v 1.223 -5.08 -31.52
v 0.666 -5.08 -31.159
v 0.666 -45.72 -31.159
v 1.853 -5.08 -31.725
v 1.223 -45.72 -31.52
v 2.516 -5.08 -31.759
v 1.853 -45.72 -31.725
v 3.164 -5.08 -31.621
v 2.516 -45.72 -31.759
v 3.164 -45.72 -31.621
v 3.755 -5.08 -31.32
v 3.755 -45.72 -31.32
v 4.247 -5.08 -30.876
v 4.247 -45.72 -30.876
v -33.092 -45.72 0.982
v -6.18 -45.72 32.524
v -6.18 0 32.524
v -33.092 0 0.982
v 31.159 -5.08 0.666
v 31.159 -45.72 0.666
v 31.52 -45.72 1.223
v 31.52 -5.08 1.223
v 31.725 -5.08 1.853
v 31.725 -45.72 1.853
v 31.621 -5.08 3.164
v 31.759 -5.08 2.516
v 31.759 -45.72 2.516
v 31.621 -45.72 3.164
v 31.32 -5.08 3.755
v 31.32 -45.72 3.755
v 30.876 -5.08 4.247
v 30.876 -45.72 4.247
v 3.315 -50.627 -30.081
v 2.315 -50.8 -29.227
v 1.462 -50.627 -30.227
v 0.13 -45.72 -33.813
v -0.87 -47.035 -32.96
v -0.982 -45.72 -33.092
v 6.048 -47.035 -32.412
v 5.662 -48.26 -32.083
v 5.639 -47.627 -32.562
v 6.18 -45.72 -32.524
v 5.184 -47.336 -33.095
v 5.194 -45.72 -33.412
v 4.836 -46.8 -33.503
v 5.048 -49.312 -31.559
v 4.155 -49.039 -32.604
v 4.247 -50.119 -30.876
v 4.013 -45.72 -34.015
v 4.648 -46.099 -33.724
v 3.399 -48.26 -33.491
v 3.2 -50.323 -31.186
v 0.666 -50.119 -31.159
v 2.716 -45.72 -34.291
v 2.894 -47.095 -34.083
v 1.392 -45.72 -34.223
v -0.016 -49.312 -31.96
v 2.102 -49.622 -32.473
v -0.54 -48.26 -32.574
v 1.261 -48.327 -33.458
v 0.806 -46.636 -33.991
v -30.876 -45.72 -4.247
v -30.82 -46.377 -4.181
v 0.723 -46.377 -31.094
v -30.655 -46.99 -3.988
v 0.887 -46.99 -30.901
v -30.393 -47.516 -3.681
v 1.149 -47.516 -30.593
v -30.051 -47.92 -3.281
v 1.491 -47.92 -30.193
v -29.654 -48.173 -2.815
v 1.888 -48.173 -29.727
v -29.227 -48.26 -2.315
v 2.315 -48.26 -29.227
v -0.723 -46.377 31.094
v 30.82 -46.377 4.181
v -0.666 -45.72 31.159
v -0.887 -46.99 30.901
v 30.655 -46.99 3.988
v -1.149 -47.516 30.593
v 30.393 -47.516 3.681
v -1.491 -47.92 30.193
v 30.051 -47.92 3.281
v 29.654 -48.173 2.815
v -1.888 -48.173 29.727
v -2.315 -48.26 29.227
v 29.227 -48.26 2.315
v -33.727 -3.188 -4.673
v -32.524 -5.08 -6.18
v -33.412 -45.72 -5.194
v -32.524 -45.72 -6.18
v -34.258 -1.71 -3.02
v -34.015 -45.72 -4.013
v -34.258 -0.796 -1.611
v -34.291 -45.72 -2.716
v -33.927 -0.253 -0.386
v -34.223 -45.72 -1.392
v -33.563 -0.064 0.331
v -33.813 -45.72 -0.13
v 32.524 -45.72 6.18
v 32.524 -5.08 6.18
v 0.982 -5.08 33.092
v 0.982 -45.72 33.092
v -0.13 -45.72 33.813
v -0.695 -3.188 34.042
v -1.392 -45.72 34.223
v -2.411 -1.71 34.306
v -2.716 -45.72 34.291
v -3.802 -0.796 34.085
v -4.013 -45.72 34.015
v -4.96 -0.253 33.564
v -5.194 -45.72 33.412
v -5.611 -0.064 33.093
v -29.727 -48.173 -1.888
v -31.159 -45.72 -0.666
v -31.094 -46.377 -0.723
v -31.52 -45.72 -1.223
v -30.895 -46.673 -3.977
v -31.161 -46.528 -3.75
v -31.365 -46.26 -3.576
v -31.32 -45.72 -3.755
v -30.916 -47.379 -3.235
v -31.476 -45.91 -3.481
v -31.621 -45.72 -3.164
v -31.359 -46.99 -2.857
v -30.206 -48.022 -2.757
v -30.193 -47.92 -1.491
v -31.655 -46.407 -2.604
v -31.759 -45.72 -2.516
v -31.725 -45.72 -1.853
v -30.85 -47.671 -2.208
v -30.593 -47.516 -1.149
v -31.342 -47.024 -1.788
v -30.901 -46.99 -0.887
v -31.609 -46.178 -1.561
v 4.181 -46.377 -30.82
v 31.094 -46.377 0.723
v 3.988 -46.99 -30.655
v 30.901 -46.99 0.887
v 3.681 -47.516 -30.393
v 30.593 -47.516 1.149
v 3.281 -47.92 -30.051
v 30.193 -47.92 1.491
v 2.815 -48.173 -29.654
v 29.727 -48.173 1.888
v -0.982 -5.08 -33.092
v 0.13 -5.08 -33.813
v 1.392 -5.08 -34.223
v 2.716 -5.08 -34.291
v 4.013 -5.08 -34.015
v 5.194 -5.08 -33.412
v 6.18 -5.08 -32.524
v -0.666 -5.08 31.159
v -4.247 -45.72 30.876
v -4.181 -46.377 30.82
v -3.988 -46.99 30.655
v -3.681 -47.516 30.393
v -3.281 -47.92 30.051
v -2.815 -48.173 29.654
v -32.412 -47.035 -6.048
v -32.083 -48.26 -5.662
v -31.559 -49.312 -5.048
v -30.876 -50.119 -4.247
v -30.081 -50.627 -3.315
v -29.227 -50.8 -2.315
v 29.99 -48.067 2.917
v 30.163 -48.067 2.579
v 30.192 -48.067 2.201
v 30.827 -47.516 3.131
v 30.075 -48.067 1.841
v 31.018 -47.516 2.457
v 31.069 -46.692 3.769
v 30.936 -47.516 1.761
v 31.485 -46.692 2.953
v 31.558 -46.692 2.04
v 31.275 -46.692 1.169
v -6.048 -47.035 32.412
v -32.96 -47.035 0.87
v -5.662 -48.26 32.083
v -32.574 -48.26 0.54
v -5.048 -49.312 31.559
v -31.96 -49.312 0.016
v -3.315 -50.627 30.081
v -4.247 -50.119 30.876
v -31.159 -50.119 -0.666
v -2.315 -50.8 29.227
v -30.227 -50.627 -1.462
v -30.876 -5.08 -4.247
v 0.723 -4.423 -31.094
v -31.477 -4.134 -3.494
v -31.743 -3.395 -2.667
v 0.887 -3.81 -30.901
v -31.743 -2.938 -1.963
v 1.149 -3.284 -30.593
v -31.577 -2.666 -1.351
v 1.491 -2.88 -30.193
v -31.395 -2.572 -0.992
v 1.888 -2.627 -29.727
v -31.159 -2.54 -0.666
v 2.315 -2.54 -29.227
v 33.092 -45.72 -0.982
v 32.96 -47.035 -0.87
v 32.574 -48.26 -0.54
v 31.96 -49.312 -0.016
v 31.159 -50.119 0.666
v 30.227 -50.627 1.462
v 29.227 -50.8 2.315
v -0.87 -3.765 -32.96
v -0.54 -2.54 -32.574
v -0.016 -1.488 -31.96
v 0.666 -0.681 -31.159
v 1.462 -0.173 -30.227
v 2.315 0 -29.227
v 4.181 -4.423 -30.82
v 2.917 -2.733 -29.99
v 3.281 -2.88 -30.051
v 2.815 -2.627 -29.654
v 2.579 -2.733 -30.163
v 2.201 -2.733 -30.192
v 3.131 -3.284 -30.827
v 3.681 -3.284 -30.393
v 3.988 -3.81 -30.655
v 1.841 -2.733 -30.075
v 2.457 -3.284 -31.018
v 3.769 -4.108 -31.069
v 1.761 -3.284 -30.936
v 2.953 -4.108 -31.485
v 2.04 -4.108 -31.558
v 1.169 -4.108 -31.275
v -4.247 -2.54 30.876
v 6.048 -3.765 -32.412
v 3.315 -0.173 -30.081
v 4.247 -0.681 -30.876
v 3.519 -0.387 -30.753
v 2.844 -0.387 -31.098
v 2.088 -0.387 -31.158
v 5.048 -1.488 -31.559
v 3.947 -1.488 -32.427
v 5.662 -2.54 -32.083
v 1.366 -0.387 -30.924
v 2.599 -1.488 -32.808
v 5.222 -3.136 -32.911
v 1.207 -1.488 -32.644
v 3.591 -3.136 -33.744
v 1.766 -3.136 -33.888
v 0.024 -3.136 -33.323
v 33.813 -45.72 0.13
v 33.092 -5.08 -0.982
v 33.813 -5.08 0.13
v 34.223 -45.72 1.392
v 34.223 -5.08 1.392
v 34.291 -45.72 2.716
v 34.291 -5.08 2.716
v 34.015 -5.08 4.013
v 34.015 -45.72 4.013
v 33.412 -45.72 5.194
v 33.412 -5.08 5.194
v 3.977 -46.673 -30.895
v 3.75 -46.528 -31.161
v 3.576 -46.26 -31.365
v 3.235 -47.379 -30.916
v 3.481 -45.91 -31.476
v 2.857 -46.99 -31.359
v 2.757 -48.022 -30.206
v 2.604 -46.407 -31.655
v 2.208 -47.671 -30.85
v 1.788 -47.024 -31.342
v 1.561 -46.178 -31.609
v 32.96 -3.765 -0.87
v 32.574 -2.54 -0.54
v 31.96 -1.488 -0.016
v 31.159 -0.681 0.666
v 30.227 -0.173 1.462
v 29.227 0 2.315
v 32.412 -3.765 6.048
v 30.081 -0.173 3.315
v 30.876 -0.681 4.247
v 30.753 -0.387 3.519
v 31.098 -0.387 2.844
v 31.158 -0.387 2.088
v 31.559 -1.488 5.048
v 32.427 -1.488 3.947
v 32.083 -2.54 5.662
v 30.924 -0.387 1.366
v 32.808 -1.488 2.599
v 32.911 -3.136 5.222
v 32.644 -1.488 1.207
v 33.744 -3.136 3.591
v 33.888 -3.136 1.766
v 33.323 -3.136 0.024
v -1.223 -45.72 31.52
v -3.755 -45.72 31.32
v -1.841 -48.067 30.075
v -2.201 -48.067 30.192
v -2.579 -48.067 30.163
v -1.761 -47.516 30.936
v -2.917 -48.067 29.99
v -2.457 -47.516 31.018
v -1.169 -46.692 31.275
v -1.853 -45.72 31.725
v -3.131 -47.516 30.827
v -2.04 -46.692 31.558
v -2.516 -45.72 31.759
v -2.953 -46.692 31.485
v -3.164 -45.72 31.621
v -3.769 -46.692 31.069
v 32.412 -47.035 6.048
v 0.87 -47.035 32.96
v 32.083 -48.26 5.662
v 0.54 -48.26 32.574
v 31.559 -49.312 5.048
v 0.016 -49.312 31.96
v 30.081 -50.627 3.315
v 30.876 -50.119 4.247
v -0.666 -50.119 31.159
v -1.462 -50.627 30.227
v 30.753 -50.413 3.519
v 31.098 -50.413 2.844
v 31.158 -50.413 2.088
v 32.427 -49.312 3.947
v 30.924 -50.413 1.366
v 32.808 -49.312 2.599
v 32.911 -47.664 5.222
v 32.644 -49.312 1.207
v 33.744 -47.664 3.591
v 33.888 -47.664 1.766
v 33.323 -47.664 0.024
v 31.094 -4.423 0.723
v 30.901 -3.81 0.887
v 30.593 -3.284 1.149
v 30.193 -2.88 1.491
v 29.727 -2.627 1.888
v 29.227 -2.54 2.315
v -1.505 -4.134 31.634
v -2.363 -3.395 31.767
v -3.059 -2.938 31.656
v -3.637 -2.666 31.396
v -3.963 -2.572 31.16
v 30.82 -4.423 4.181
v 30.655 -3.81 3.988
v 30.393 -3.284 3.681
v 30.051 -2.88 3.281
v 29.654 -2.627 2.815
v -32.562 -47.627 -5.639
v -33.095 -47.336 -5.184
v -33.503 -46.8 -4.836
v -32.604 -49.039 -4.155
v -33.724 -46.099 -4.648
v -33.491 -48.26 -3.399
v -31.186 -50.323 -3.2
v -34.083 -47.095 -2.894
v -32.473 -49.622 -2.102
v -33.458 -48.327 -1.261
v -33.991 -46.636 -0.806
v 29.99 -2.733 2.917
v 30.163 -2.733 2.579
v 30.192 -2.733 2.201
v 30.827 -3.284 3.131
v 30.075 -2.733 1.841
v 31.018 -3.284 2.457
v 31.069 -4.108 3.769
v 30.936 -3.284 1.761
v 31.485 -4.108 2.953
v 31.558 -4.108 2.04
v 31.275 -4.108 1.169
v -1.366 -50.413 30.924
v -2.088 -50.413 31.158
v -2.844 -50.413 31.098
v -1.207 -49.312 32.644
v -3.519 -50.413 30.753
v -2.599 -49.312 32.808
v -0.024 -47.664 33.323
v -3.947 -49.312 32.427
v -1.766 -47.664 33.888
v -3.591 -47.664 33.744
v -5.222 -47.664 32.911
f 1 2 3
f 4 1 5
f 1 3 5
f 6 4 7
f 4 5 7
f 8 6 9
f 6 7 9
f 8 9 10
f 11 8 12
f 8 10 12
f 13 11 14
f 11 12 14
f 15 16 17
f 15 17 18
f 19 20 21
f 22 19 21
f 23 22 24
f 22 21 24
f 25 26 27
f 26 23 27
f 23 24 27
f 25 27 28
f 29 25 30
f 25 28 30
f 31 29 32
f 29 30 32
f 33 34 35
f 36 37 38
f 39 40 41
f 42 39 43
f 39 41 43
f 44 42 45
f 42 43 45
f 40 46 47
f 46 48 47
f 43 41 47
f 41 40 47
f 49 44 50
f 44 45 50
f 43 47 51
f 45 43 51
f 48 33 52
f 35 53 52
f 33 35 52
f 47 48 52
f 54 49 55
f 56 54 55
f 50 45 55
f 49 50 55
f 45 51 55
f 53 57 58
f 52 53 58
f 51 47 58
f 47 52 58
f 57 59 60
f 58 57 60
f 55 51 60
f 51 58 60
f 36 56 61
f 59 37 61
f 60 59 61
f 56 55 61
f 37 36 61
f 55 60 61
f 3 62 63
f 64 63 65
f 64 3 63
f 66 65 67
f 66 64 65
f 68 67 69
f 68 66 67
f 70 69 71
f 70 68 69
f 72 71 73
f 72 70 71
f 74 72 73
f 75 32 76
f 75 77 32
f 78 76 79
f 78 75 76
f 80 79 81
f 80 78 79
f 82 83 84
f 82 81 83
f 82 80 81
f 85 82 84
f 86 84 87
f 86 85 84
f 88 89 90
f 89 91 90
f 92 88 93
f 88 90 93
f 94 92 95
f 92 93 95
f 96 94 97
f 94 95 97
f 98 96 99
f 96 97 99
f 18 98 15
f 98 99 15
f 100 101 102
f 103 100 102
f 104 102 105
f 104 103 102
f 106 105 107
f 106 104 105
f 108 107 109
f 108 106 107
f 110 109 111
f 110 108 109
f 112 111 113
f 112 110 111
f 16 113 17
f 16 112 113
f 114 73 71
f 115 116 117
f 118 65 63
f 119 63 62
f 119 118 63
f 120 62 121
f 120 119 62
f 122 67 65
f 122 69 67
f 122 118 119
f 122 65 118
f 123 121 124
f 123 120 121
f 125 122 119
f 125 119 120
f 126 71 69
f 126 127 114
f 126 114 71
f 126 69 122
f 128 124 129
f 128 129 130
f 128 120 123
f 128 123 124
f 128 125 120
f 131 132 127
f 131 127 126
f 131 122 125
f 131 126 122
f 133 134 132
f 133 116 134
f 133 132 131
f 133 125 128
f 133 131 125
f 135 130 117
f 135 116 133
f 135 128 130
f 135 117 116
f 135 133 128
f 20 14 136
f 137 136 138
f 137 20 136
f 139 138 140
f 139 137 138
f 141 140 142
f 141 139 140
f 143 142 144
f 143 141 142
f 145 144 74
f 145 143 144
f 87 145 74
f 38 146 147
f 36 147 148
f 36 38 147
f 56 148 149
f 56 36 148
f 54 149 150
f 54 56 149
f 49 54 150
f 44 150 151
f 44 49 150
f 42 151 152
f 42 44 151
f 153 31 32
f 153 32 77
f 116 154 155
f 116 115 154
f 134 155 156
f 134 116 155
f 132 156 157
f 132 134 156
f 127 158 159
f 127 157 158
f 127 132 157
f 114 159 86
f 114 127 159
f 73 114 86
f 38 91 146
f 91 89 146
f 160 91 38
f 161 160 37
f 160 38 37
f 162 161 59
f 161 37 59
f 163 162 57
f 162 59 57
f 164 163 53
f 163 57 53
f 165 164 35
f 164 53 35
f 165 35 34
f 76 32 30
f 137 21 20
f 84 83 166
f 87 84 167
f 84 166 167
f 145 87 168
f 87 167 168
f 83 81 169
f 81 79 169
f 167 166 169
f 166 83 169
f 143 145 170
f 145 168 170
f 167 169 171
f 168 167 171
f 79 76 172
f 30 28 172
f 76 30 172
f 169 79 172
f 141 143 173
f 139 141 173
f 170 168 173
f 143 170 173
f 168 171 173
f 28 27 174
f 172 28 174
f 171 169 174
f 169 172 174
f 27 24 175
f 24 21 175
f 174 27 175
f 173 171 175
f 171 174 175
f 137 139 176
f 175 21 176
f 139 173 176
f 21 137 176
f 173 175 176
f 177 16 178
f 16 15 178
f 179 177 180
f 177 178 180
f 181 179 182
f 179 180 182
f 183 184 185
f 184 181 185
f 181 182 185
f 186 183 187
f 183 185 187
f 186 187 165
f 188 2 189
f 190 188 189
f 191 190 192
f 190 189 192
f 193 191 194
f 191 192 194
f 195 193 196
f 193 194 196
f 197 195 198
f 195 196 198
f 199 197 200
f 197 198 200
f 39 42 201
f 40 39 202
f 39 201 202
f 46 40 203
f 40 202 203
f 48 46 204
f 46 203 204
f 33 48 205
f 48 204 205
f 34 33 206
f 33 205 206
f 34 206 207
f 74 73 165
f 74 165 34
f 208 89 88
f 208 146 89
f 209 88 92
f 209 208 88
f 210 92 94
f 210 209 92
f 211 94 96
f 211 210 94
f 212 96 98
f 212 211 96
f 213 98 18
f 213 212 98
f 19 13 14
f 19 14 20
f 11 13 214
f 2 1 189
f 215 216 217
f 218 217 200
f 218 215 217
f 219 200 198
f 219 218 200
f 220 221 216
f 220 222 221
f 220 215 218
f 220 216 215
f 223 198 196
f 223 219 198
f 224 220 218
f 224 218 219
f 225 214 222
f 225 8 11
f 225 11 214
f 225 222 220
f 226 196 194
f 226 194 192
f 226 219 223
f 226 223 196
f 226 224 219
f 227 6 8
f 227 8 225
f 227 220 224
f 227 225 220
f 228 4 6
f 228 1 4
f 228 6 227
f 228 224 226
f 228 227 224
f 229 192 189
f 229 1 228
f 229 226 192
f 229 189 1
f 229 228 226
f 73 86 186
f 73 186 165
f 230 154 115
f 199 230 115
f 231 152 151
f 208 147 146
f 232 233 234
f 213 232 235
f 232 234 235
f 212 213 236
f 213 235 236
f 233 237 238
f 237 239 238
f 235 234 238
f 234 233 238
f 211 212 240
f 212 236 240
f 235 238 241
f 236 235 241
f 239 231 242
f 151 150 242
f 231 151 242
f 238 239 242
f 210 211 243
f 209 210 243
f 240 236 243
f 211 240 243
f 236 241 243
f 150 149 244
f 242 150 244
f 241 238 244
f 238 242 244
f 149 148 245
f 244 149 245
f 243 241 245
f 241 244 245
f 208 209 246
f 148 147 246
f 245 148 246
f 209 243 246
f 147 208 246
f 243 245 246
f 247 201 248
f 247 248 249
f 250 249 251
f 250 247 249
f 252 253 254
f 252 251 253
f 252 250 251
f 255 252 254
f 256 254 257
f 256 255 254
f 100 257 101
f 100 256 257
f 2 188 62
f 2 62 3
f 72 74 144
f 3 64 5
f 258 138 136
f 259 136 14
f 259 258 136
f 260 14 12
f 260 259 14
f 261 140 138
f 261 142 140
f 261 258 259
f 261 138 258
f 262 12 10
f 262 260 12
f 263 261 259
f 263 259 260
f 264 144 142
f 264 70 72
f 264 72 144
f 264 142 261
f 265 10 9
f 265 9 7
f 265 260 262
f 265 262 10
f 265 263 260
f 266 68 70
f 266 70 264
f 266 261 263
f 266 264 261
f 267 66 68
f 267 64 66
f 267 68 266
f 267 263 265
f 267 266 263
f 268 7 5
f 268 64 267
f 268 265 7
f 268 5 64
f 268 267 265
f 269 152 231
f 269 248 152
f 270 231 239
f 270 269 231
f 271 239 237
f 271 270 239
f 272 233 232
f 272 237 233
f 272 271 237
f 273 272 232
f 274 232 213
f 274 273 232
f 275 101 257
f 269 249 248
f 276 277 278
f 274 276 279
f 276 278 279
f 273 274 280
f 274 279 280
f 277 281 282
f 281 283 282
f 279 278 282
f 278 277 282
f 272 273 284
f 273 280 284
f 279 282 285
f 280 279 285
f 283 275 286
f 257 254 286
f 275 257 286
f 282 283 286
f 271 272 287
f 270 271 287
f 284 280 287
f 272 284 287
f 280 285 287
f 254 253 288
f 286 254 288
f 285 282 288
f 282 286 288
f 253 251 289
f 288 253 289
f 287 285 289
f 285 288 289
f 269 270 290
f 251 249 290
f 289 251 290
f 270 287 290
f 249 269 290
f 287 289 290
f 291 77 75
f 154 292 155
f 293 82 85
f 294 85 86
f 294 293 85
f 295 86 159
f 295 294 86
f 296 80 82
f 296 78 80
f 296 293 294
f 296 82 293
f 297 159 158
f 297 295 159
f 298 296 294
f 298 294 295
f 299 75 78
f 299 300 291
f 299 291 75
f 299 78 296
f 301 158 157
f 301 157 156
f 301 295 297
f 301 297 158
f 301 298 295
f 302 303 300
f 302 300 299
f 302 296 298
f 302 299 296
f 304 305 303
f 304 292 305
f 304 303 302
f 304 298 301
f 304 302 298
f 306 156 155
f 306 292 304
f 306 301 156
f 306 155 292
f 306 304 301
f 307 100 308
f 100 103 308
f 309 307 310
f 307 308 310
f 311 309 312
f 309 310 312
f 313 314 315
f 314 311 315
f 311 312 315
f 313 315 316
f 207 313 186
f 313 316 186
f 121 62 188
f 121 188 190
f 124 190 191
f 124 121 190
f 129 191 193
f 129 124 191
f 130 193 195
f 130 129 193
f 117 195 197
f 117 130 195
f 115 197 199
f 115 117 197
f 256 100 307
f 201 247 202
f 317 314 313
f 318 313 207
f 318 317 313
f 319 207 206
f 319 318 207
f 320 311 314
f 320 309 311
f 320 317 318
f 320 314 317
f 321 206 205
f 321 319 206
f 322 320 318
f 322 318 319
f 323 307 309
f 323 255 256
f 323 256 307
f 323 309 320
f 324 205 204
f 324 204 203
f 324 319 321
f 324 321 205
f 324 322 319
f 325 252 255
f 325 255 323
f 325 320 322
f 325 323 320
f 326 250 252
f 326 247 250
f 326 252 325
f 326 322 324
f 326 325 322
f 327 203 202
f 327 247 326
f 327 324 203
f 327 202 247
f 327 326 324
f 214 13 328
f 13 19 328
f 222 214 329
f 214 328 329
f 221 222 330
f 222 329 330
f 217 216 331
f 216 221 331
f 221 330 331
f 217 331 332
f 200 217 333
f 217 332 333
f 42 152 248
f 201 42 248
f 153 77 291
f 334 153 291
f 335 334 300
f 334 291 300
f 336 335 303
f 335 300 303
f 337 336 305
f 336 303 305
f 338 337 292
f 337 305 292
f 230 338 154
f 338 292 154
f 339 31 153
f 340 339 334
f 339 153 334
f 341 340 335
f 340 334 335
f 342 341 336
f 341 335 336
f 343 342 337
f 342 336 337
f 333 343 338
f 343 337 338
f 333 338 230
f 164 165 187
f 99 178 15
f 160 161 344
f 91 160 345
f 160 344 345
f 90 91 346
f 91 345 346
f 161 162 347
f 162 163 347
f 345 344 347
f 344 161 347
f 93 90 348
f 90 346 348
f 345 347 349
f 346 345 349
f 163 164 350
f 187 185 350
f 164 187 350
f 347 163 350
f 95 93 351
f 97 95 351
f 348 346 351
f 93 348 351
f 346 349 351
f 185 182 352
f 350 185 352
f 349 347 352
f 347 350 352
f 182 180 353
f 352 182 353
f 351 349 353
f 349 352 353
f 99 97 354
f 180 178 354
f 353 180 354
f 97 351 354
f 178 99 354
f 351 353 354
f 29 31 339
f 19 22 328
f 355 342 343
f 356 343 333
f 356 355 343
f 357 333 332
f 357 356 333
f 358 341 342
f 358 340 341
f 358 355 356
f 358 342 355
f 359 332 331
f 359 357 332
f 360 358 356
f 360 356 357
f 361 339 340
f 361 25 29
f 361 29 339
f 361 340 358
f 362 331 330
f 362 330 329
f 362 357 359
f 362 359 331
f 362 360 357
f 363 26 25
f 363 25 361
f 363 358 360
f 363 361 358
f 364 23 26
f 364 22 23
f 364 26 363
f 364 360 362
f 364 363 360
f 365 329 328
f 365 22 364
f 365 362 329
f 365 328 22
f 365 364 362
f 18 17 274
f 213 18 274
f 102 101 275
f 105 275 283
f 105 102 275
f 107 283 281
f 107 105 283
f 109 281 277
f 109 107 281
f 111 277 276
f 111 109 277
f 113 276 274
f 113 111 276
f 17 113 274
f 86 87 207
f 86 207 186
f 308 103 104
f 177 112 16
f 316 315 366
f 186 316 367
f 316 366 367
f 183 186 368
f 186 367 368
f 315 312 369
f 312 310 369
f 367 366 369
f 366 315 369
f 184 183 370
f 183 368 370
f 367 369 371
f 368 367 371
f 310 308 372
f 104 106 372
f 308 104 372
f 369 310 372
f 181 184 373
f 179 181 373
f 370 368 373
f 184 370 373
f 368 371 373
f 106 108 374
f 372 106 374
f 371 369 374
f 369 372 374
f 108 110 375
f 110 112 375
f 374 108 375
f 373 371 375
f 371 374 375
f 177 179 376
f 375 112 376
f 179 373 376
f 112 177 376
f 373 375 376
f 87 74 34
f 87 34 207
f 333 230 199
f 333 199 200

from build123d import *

# Parameters (mm, degrees)
F1_DEPTH = 50.8
F2_R     = 5.08
F3_T     = -2.54


# Not quite as in the source:
# - a shell that OpenCascade refuses in one call is made with other operations: the cavity is built on its own and cut out


with BuildPart() as f1:
    # F0 (on Front) → F1 (new body)
    with BuildSketch(Plane.XZ):
        Polygon((-36.388931796, -2.8822999448), (2.8822999448, -36.388931796), (36.388931796, 2.8822999448), (-2.8822999448, 36.388931796), align=None)
    extrude(amount=F1_DEPTH)

    # F2
    f2_edges = [f1.edges().sort_by_distance(p)[0] for p in [
        (36.388932, -25.4, 2.8823),
        (-2.8823, -25.4, 36.388932),
        (16.753316, 0, 19.635616),
        (16.753316, -50.8, 19.635616),
        (-19.635616, -50.8, 16.753316),
        (-16.753316, -50.8, -19.635616),
        (19.635616, -50.8, -16.753316),
        (2.8823, -25.4, -36.388932),
        (19.635616, 0, -16.753316),
        (-36.388932, -25.4, -2.8823),
        (-16.753316, 0, -19.635616),
    ]]
    fillet(f2_edges, radius=F2_R)

    # F3: a shell. OpenCascade refuses it in one call, so the cavity is built on its own and cut out:
    # the body offset inwards by the wall thickness, plus a prism from it out through each open face.
    f3_core = offset(f1.part, amount=F3_T, mode=Mode.PRIVATE)
    f3_exits = [f3_core.faces().sort_by_distance(p)[0] for p in [
        (0, -48.26, 0),
    ]]
    add(f3_core, mode=Mode.SUBTRACT)
    extrude(f3_exits, amount=-F3_T, mode=Mode.SUBTRACT)


solid = f1.part
